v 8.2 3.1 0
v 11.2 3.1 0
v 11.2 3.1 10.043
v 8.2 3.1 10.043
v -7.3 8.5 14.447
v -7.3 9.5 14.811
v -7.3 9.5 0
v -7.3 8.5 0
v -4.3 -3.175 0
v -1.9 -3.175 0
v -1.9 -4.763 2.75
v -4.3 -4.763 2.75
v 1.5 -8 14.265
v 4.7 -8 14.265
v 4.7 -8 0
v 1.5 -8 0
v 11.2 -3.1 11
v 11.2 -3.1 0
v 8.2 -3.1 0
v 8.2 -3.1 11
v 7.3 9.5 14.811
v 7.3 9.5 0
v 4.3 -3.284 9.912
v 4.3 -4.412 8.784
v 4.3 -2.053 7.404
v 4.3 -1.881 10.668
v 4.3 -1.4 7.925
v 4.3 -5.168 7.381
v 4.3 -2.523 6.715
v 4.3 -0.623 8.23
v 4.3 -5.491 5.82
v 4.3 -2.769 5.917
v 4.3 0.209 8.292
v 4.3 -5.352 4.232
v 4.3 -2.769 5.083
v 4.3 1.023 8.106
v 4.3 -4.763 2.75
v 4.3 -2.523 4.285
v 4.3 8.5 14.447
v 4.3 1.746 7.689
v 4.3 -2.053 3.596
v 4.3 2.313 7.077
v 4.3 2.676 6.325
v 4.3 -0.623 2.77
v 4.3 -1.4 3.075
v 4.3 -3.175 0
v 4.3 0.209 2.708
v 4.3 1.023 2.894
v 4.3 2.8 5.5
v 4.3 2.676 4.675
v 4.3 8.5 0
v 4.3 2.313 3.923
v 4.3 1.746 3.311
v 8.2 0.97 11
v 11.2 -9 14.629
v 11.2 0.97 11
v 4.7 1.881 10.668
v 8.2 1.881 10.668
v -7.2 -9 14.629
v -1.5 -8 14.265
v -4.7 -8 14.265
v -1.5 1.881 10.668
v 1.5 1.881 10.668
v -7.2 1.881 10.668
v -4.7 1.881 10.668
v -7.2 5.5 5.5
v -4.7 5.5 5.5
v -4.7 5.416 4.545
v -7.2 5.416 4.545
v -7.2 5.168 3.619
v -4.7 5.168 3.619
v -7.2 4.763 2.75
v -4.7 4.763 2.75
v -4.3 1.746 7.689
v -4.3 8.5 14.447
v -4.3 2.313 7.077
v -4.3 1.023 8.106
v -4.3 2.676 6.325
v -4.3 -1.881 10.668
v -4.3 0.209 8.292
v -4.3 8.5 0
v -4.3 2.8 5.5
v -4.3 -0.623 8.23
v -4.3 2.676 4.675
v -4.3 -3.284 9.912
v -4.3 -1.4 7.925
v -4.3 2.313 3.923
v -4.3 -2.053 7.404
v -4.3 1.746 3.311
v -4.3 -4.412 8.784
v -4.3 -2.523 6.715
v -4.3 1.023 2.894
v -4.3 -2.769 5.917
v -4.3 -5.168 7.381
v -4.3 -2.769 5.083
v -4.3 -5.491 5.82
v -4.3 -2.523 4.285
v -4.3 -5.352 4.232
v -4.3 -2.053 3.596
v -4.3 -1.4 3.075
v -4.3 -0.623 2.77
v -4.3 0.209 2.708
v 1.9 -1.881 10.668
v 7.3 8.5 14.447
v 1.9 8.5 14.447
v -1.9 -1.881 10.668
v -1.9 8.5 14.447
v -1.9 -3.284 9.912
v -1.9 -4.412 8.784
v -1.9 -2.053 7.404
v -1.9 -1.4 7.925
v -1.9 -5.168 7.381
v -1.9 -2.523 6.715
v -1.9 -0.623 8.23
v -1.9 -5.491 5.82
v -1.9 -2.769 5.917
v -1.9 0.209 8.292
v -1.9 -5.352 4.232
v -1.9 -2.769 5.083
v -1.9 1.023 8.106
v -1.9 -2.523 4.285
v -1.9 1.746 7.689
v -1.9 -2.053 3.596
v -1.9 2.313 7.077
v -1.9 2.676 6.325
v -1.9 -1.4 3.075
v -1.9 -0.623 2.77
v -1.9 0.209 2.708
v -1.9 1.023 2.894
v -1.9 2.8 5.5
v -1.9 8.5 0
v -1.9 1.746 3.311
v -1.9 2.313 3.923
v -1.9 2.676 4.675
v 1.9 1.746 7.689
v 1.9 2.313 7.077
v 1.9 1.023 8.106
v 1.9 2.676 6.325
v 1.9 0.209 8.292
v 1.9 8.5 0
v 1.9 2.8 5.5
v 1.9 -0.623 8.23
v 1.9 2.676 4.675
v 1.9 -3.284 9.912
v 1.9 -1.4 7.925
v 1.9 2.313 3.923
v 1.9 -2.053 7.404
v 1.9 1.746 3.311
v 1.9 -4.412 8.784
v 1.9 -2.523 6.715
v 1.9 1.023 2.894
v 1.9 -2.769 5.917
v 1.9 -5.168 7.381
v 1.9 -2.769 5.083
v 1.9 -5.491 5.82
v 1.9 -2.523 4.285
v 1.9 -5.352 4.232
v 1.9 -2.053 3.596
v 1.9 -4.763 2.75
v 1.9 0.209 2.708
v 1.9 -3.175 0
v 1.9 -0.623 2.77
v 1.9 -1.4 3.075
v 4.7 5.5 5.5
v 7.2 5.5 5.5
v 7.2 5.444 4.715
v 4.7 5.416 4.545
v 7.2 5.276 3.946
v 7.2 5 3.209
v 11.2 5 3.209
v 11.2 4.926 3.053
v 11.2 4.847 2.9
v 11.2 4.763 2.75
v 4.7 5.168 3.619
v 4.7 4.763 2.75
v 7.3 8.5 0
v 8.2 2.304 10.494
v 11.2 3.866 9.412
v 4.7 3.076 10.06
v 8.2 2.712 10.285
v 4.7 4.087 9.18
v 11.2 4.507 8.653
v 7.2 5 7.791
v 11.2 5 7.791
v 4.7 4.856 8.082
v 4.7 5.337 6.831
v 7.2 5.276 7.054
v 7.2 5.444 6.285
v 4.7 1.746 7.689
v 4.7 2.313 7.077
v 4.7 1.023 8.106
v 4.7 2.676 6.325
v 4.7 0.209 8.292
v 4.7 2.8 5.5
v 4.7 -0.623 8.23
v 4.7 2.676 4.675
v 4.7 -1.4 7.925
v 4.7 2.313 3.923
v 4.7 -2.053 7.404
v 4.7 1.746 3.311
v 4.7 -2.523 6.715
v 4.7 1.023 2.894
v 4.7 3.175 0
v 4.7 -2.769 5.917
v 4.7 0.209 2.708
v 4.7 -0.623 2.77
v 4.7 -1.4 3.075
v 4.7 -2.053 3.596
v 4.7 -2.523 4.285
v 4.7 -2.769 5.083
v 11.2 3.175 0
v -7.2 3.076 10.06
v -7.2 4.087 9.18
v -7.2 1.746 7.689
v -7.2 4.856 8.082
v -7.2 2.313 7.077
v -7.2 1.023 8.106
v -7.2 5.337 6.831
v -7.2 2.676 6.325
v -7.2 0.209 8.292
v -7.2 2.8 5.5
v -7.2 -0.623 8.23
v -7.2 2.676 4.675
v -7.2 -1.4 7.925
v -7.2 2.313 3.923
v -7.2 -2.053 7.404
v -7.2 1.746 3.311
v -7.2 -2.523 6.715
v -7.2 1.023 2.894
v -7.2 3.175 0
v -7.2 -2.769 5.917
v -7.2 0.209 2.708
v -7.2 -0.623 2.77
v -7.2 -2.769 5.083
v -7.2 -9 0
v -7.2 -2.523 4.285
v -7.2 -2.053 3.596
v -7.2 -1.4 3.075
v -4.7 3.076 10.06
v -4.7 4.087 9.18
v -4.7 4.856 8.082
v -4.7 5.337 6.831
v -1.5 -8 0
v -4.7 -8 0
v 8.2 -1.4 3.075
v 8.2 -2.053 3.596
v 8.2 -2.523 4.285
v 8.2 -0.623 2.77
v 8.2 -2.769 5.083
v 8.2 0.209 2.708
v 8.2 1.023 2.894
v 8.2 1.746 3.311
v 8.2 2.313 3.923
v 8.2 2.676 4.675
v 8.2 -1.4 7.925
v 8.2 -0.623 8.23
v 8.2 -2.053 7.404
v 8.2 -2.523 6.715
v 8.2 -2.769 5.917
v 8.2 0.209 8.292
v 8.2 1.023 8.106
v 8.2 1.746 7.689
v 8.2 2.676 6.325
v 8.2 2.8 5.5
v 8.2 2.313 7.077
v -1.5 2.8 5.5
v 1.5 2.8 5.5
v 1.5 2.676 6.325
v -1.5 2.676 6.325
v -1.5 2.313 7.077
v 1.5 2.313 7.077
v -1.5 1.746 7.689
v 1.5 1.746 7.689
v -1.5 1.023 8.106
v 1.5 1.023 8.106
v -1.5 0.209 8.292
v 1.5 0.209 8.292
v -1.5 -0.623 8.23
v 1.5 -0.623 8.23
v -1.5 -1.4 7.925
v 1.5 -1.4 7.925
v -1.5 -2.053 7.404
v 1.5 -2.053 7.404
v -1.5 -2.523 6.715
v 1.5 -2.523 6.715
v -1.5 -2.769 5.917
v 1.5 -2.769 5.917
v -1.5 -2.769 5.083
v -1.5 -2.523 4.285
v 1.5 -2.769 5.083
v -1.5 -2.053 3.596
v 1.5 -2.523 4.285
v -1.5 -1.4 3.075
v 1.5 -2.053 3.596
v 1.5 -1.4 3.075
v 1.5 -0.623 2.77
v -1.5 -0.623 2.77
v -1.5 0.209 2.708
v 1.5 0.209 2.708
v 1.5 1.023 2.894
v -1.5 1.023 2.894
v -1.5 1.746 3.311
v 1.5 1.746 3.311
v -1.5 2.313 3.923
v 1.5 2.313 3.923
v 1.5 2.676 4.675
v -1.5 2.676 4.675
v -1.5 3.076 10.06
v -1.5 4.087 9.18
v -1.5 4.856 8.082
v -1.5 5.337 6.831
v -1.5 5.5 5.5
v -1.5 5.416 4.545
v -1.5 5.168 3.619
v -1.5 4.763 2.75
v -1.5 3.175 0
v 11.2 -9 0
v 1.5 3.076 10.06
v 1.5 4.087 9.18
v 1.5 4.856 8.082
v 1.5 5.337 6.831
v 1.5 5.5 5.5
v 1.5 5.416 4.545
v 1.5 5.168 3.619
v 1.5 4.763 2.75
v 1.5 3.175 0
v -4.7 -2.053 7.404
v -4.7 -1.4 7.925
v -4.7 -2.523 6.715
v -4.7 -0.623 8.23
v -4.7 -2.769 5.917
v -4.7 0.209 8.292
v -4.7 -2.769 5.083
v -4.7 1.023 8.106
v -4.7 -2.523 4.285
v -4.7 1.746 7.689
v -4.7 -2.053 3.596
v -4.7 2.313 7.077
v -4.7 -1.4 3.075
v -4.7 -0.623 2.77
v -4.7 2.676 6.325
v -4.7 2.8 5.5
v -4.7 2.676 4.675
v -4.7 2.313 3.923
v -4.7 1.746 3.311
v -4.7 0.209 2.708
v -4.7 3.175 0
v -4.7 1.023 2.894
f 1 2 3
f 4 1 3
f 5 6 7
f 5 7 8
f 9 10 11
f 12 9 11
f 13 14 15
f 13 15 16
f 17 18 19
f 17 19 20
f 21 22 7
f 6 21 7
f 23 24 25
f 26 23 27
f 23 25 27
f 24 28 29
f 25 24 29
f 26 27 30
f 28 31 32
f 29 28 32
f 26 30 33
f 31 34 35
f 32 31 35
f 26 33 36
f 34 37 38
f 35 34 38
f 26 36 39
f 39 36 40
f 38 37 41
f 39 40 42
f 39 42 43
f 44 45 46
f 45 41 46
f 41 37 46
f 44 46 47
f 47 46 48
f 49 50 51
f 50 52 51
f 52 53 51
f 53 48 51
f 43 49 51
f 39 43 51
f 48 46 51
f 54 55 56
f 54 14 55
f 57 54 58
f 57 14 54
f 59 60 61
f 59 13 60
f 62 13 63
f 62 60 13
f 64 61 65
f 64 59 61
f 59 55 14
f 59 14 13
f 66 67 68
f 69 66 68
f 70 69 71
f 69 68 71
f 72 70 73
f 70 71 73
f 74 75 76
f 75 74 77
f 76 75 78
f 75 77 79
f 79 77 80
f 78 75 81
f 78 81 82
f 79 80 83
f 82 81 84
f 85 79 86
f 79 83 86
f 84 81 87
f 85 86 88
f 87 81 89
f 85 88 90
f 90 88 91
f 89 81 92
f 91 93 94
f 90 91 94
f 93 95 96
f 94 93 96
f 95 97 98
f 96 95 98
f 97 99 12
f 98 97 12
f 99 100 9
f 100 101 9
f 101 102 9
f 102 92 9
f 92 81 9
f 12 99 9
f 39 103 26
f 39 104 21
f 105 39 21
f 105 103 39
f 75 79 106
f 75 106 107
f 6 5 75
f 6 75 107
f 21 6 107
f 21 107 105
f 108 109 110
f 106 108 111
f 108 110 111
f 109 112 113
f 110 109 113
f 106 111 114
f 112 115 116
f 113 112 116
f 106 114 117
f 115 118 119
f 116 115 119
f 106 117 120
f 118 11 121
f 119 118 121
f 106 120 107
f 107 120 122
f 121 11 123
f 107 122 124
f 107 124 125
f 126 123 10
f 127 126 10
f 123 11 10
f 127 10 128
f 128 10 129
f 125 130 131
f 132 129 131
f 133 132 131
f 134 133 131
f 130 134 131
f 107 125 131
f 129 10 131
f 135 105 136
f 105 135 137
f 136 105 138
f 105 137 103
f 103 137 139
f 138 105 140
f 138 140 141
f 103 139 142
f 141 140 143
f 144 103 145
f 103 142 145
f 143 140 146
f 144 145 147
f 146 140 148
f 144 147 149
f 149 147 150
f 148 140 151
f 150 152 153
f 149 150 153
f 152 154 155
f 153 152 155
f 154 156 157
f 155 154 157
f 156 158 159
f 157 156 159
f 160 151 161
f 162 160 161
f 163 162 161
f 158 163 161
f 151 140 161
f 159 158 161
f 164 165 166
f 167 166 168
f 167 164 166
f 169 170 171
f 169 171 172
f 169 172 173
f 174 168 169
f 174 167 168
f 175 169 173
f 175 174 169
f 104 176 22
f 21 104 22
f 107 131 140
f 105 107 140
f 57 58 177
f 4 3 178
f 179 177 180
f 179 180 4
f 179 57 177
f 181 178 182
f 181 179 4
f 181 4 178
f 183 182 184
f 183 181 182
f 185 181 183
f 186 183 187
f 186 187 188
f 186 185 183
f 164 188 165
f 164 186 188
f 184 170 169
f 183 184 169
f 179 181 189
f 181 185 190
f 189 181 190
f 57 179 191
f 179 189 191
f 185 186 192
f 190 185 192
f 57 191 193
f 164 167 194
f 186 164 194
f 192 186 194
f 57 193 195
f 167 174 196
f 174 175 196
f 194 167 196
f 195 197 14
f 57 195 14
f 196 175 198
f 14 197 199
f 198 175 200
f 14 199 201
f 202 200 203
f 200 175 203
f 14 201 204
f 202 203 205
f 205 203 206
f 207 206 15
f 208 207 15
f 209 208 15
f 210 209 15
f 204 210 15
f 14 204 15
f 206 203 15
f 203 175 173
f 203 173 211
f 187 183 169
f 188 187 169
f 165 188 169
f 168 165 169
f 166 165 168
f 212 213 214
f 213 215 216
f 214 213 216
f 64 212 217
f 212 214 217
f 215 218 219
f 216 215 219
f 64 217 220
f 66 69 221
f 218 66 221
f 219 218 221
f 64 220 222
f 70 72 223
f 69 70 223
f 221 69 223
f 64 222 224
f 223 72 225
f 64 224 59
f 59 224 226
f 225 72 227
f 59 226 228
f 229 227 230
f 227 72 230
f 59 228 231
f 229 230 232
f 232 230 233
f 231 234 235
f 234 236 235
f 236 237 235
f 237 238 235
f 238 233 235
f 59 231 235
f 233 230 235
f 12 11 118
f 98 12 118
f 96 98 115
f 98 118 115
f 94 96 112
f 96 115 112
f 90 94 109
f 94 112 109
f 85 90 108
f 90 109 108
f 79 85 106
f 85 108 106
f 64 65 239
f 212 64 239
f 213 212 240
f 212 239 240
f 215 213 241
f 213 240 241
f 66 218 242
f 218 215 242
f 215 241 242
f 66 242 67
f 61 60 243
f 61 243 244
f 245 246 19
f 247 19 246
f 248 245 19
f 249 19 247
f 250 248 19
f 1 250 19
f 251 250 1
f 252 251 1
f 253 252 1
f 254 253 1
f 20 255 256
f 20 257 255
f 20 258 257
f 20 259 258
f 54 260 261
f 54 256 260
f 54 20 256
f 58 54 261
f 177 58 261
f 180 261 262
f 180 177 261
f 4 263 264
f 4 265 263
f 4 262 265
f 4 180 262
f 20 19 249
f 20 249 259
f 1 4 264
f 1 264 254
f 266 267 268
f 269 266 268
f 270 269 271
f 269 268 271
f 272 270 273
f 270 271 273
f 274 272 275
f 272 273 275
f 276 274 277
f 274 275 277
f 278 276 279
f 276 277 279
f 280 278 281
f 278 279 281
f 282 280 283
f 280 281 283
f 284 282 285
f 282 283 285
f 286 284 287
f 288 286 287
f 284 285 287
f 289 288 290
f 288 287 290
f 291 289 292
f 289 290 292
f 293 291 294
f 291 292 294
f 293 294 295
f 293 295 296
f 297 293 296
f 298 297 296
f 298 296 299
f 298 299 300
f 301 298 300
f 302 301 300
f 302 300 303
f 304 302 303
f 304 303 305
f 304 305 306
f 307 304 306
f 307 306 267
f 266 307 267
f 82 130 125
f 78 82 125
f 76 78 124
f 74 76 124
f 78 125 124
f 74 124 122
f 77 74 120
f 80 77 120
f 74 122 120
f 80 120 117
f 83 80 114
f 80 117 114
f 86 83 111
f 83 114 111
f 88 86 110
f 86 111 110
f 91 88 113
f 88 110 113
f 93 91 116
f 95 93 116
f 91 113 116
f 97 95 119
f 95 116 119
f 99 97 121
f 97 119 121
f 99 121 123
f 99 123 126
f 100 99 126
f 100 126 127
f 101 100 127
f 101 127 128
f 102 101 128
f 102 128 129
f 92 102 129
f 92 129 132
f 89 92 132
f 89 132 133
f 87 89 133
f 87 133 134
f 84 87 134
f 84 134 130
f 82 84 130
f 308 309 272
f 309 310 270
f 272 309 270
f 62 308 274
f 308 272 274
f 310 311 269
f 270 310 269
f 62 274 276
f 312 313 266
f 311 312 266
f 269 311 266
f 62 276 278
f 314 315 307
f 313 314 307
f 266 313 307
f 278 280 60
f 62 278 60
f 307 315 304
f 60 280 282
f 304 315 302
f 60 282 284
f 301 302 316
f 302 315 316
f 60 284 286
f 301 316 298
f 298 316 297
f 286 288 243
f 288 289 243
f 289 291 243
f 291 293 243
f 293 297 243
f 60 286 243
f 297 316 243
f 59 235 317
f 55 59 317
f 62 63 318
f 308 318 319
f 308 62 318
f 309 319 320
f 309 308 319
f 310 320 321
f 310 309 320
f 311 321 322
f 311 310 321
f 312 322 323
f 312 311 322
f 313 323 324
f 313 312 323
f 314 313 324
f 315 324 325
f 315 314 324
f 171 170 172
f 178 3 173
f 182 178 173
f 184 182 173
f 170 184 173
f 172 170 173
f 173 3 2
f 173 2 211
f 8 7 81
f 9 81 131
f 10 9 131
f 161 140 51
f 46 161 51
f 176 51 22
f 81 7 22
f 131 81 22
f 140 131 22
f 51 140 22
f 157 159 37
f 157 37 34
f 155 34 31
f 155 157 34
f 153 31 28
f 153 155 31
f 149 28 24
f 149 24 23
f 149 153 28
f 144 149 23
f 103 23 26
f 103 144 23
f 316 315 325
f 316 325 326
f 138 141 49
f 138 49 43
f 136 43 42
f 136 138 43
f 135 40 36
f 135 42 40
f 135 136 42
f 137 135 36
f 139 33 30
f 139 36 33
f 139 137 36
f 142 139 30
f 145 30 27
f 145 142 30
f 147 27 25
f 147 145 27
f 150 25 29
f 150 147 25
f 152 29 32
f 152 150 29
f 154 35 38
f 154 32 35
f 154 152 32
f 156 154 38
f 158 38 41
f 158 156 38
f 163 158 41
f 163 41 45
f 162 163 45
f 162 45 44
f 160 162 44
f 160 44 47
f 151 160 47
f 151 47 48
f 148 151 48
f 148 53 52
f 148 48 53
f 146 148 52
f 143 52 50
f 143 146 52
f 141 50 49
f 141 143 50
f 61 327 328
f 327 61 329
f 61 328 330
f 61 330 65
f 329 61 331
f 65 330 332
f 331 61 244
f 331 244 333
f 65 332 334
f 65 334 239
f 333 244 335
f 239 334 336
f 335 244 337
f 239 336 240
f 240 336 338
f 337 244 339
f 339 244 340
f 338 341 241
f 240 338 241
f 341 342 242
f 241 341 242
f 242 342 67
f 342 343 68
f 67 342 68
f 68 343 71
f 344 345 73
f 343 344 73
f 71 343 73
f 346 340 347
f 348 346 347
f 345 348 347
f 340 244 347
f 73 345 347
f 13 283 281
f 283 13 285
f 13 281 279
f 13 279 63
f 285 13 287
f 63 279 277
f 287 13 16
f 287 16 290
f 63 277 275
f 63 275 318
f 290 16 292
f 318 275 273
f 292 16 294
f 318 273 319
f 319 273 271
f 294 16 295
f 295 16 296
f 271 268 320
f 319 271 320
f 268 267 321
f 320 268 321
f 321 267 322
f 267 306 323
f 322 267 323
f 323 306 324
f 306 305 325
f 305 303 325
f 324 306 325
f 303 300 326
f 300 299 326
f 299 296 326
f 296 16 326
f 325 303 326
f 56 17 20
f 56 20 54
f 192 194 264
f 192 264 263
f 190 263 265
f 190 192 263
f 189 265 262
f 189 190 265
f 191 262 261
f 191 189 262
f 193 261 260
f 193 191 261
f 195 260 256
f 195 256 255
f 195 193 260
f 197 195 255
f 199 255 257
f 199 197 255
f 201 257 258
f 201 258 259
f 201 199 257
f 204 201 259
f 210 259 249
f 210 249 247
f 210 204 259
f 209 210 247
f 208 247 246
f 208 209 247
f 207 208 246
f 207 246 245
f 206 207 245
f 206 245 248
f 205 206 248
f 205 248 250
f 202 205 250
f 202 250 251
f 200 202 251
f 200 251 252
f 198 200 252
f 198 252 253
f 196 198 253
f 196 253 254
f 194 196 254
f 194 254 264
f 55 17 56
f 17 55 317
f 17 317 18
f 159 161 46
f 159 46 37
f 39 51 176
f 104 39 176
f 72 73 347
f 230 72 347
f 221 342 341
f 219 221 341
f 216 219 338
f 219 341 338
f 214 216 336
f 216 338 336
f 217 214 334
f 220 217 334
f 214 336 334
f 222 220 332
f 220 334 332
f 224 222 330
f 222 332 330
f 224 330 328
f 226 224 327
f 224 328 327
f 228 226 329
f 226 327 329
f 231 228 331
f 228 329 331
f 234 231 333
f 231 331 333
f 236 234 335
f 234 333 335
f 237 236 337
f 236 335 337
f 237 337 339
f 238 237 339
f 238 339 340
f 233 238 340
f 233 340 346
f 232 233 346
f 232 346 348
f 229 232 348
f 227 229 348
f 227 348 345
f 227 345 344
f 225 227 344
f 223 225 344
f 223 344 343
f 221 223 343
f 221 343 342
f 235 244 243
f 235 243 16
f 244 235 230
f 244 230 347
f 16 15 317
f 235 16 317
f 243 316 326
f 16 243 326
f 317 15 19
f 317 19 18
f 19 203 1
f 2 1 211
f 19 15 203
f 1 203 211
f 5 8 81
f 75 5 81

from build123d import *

# Parameters (mm, degrees)
F1_DEPTH      = 25
F2_R          = 2.8
F3_DEPTH      = 7.301
F3_DEPTH_BACK = 11.201
F4_DEPTH      = 7.301
F4_DEPTH_BACK = 11.201
F5_DEPTH      = 7.301
F5_DEPTH_BACK = 11.201
F6_W          = 6.2
F6_H          = 11
F6_R          = 2.8
F7_DEPTH      = 3


with BuildPart() as f1:
    # F0 (on Top) → F1 (new body)
    with BuildSketch(Plane.XY):
        Polygon((7.3, 9.5), (0, 9.5), (-7.3, 9.5), (-7.3, 8.5), (-4.3, 8.5), (-4.3, -6.5), (-1.9, -6.5), (-1.9, 8.5), (0, 8.5), (1.9, 8.5), (1.9, -6.5), (4.3, -6.5), (4.3, 8.5), (7.3, 8.5), align=None)
    extrude(amount=F1_DEPTH)


with BuildPart() as f1b:
    # F0 (on Top) → F1, piece 2 (new body)
    with BuildSketch(Plane.XY):
        Polygon((1.5, 5.5), (0, 5.5), (-1.5, 5.5), (-1.5, -8), (-4.7, -8), (-4.7, 5.5), (-7.2, 5.5), (-7.2, -9), (11.2, -9), (11.2, 5), (7.2, 5), (7.2, 5.5), (4.7, 5.5), (4.7, -8), (1.5, -8), align=None)
    extrude(amount=F1_DEPTH)

    # F2 (on Right) → F3 (cut, two sides)
    with BuildSketch(Plane.YZ) as f3_sk:
        with Locations((0, 5.5)):
            Circle(F2_R)
        with BuildLine():
            ThreePointArc((1.8811107883, 10.6683094143), (4.5053362436, 8.6546703999), (5.5, 5.5))
            ThreePointArc((5.5, 5.5), (5.3125920446, 4.0764952519), (4.7631397208, 2.75))
            Line((4.7631397208, 2.75), (3.1754264805, 0))
            Line((3.1754264805, 0), (37.4948854785, 0))
            Line((37.4948854785, 0), (37.4948854785, 25))
            Line((37.4948854785, 25), (0, 11.3529777486))
            Line((0, 11.3529777486), (1.8811107883, 10.6683094143))
        make_face()
    extrude(amount=-F3_DEPTH, mode=Mode.SUBTRACT)
    extrude(f3_sk.sketch, amount=F3_DEPTH_BACK, mode=Mode.SUBTRACT)


with BuildPart() as f4_tool:
    # F2 (on Right) → F4 (new body, two sides)
    with BuildSketch(Plane.YZ) as f4_sk:
        with Locations((0, 5.5)):
            Circle(F2_R)
        Polygon((-37.4948854785, 25), (0, 11.3529777486), (37.4948854785, 25), align=None)
    extrude(amount=-F4_DEPTH)
    extrude(f4_sk.sketch, amount=F4_DEPTH_BACK)


with BuildPart() as f1_1:
    add(f1.part)

    # F4: cut by f4_tool
    add(f4_tool.part, mode=Mode.SUBTRACT)

    # F2 (on Right) → F5 (cut, two sides)
    with BuildSketch(Plane.YZ) as f5_sk:
        Polygon((-37.4948854785, 25), (0, 11.3529777486), (37.4948854785, 25), align=None)
        with BuildLine():
            ThreePointArc((-4.7631397208, 2.75), (-5.1683094143, 7.3811107883), (-1.8811107883, 10.6683094143))
            Line((-1.8811107883, 10.6683094143), (0, 11.3529777486))
            Line((0, 11.3529777486), (-37.4948854785, 25))
            Line((-37.4948854785, 25), (-37.4948854785, 0))
            Line((-37.4948854785, 0), (-3.1754264805, 0))
            Line((-3.1754264805, 0), (-4.7631397208, 2.75))
        make_face()
    extrude(amount=-F5_DEPTH, mode=Mode.SUBTRACT)
    extrude(f5_sk.sketch, amount=F5_DEPTH_BACK, mode=Mode.SUBTRACT)


with BuildPart() as f1b_1:
    add(f1b.part)

    # F4: cut by f4_tool
    add(f4_tool.part, mode=Mode.SUBTRACT)

    # F6 (on face) → F7 (cut)
    with BuildSketch(Plane.YZ.offset(11.2)):
        with Locations((0, 5.5)):
            Rectangle(F6_W, F6_H)
        with Locations((0, 5.5)):
            Circle(F6_R, mode=Mode.SUBTRACT)
    extrude(amount=-F7_DEPTH, mode=Mode.SUBTRACT)


solid = Compound([f1_1.part, f1b_1.part])
